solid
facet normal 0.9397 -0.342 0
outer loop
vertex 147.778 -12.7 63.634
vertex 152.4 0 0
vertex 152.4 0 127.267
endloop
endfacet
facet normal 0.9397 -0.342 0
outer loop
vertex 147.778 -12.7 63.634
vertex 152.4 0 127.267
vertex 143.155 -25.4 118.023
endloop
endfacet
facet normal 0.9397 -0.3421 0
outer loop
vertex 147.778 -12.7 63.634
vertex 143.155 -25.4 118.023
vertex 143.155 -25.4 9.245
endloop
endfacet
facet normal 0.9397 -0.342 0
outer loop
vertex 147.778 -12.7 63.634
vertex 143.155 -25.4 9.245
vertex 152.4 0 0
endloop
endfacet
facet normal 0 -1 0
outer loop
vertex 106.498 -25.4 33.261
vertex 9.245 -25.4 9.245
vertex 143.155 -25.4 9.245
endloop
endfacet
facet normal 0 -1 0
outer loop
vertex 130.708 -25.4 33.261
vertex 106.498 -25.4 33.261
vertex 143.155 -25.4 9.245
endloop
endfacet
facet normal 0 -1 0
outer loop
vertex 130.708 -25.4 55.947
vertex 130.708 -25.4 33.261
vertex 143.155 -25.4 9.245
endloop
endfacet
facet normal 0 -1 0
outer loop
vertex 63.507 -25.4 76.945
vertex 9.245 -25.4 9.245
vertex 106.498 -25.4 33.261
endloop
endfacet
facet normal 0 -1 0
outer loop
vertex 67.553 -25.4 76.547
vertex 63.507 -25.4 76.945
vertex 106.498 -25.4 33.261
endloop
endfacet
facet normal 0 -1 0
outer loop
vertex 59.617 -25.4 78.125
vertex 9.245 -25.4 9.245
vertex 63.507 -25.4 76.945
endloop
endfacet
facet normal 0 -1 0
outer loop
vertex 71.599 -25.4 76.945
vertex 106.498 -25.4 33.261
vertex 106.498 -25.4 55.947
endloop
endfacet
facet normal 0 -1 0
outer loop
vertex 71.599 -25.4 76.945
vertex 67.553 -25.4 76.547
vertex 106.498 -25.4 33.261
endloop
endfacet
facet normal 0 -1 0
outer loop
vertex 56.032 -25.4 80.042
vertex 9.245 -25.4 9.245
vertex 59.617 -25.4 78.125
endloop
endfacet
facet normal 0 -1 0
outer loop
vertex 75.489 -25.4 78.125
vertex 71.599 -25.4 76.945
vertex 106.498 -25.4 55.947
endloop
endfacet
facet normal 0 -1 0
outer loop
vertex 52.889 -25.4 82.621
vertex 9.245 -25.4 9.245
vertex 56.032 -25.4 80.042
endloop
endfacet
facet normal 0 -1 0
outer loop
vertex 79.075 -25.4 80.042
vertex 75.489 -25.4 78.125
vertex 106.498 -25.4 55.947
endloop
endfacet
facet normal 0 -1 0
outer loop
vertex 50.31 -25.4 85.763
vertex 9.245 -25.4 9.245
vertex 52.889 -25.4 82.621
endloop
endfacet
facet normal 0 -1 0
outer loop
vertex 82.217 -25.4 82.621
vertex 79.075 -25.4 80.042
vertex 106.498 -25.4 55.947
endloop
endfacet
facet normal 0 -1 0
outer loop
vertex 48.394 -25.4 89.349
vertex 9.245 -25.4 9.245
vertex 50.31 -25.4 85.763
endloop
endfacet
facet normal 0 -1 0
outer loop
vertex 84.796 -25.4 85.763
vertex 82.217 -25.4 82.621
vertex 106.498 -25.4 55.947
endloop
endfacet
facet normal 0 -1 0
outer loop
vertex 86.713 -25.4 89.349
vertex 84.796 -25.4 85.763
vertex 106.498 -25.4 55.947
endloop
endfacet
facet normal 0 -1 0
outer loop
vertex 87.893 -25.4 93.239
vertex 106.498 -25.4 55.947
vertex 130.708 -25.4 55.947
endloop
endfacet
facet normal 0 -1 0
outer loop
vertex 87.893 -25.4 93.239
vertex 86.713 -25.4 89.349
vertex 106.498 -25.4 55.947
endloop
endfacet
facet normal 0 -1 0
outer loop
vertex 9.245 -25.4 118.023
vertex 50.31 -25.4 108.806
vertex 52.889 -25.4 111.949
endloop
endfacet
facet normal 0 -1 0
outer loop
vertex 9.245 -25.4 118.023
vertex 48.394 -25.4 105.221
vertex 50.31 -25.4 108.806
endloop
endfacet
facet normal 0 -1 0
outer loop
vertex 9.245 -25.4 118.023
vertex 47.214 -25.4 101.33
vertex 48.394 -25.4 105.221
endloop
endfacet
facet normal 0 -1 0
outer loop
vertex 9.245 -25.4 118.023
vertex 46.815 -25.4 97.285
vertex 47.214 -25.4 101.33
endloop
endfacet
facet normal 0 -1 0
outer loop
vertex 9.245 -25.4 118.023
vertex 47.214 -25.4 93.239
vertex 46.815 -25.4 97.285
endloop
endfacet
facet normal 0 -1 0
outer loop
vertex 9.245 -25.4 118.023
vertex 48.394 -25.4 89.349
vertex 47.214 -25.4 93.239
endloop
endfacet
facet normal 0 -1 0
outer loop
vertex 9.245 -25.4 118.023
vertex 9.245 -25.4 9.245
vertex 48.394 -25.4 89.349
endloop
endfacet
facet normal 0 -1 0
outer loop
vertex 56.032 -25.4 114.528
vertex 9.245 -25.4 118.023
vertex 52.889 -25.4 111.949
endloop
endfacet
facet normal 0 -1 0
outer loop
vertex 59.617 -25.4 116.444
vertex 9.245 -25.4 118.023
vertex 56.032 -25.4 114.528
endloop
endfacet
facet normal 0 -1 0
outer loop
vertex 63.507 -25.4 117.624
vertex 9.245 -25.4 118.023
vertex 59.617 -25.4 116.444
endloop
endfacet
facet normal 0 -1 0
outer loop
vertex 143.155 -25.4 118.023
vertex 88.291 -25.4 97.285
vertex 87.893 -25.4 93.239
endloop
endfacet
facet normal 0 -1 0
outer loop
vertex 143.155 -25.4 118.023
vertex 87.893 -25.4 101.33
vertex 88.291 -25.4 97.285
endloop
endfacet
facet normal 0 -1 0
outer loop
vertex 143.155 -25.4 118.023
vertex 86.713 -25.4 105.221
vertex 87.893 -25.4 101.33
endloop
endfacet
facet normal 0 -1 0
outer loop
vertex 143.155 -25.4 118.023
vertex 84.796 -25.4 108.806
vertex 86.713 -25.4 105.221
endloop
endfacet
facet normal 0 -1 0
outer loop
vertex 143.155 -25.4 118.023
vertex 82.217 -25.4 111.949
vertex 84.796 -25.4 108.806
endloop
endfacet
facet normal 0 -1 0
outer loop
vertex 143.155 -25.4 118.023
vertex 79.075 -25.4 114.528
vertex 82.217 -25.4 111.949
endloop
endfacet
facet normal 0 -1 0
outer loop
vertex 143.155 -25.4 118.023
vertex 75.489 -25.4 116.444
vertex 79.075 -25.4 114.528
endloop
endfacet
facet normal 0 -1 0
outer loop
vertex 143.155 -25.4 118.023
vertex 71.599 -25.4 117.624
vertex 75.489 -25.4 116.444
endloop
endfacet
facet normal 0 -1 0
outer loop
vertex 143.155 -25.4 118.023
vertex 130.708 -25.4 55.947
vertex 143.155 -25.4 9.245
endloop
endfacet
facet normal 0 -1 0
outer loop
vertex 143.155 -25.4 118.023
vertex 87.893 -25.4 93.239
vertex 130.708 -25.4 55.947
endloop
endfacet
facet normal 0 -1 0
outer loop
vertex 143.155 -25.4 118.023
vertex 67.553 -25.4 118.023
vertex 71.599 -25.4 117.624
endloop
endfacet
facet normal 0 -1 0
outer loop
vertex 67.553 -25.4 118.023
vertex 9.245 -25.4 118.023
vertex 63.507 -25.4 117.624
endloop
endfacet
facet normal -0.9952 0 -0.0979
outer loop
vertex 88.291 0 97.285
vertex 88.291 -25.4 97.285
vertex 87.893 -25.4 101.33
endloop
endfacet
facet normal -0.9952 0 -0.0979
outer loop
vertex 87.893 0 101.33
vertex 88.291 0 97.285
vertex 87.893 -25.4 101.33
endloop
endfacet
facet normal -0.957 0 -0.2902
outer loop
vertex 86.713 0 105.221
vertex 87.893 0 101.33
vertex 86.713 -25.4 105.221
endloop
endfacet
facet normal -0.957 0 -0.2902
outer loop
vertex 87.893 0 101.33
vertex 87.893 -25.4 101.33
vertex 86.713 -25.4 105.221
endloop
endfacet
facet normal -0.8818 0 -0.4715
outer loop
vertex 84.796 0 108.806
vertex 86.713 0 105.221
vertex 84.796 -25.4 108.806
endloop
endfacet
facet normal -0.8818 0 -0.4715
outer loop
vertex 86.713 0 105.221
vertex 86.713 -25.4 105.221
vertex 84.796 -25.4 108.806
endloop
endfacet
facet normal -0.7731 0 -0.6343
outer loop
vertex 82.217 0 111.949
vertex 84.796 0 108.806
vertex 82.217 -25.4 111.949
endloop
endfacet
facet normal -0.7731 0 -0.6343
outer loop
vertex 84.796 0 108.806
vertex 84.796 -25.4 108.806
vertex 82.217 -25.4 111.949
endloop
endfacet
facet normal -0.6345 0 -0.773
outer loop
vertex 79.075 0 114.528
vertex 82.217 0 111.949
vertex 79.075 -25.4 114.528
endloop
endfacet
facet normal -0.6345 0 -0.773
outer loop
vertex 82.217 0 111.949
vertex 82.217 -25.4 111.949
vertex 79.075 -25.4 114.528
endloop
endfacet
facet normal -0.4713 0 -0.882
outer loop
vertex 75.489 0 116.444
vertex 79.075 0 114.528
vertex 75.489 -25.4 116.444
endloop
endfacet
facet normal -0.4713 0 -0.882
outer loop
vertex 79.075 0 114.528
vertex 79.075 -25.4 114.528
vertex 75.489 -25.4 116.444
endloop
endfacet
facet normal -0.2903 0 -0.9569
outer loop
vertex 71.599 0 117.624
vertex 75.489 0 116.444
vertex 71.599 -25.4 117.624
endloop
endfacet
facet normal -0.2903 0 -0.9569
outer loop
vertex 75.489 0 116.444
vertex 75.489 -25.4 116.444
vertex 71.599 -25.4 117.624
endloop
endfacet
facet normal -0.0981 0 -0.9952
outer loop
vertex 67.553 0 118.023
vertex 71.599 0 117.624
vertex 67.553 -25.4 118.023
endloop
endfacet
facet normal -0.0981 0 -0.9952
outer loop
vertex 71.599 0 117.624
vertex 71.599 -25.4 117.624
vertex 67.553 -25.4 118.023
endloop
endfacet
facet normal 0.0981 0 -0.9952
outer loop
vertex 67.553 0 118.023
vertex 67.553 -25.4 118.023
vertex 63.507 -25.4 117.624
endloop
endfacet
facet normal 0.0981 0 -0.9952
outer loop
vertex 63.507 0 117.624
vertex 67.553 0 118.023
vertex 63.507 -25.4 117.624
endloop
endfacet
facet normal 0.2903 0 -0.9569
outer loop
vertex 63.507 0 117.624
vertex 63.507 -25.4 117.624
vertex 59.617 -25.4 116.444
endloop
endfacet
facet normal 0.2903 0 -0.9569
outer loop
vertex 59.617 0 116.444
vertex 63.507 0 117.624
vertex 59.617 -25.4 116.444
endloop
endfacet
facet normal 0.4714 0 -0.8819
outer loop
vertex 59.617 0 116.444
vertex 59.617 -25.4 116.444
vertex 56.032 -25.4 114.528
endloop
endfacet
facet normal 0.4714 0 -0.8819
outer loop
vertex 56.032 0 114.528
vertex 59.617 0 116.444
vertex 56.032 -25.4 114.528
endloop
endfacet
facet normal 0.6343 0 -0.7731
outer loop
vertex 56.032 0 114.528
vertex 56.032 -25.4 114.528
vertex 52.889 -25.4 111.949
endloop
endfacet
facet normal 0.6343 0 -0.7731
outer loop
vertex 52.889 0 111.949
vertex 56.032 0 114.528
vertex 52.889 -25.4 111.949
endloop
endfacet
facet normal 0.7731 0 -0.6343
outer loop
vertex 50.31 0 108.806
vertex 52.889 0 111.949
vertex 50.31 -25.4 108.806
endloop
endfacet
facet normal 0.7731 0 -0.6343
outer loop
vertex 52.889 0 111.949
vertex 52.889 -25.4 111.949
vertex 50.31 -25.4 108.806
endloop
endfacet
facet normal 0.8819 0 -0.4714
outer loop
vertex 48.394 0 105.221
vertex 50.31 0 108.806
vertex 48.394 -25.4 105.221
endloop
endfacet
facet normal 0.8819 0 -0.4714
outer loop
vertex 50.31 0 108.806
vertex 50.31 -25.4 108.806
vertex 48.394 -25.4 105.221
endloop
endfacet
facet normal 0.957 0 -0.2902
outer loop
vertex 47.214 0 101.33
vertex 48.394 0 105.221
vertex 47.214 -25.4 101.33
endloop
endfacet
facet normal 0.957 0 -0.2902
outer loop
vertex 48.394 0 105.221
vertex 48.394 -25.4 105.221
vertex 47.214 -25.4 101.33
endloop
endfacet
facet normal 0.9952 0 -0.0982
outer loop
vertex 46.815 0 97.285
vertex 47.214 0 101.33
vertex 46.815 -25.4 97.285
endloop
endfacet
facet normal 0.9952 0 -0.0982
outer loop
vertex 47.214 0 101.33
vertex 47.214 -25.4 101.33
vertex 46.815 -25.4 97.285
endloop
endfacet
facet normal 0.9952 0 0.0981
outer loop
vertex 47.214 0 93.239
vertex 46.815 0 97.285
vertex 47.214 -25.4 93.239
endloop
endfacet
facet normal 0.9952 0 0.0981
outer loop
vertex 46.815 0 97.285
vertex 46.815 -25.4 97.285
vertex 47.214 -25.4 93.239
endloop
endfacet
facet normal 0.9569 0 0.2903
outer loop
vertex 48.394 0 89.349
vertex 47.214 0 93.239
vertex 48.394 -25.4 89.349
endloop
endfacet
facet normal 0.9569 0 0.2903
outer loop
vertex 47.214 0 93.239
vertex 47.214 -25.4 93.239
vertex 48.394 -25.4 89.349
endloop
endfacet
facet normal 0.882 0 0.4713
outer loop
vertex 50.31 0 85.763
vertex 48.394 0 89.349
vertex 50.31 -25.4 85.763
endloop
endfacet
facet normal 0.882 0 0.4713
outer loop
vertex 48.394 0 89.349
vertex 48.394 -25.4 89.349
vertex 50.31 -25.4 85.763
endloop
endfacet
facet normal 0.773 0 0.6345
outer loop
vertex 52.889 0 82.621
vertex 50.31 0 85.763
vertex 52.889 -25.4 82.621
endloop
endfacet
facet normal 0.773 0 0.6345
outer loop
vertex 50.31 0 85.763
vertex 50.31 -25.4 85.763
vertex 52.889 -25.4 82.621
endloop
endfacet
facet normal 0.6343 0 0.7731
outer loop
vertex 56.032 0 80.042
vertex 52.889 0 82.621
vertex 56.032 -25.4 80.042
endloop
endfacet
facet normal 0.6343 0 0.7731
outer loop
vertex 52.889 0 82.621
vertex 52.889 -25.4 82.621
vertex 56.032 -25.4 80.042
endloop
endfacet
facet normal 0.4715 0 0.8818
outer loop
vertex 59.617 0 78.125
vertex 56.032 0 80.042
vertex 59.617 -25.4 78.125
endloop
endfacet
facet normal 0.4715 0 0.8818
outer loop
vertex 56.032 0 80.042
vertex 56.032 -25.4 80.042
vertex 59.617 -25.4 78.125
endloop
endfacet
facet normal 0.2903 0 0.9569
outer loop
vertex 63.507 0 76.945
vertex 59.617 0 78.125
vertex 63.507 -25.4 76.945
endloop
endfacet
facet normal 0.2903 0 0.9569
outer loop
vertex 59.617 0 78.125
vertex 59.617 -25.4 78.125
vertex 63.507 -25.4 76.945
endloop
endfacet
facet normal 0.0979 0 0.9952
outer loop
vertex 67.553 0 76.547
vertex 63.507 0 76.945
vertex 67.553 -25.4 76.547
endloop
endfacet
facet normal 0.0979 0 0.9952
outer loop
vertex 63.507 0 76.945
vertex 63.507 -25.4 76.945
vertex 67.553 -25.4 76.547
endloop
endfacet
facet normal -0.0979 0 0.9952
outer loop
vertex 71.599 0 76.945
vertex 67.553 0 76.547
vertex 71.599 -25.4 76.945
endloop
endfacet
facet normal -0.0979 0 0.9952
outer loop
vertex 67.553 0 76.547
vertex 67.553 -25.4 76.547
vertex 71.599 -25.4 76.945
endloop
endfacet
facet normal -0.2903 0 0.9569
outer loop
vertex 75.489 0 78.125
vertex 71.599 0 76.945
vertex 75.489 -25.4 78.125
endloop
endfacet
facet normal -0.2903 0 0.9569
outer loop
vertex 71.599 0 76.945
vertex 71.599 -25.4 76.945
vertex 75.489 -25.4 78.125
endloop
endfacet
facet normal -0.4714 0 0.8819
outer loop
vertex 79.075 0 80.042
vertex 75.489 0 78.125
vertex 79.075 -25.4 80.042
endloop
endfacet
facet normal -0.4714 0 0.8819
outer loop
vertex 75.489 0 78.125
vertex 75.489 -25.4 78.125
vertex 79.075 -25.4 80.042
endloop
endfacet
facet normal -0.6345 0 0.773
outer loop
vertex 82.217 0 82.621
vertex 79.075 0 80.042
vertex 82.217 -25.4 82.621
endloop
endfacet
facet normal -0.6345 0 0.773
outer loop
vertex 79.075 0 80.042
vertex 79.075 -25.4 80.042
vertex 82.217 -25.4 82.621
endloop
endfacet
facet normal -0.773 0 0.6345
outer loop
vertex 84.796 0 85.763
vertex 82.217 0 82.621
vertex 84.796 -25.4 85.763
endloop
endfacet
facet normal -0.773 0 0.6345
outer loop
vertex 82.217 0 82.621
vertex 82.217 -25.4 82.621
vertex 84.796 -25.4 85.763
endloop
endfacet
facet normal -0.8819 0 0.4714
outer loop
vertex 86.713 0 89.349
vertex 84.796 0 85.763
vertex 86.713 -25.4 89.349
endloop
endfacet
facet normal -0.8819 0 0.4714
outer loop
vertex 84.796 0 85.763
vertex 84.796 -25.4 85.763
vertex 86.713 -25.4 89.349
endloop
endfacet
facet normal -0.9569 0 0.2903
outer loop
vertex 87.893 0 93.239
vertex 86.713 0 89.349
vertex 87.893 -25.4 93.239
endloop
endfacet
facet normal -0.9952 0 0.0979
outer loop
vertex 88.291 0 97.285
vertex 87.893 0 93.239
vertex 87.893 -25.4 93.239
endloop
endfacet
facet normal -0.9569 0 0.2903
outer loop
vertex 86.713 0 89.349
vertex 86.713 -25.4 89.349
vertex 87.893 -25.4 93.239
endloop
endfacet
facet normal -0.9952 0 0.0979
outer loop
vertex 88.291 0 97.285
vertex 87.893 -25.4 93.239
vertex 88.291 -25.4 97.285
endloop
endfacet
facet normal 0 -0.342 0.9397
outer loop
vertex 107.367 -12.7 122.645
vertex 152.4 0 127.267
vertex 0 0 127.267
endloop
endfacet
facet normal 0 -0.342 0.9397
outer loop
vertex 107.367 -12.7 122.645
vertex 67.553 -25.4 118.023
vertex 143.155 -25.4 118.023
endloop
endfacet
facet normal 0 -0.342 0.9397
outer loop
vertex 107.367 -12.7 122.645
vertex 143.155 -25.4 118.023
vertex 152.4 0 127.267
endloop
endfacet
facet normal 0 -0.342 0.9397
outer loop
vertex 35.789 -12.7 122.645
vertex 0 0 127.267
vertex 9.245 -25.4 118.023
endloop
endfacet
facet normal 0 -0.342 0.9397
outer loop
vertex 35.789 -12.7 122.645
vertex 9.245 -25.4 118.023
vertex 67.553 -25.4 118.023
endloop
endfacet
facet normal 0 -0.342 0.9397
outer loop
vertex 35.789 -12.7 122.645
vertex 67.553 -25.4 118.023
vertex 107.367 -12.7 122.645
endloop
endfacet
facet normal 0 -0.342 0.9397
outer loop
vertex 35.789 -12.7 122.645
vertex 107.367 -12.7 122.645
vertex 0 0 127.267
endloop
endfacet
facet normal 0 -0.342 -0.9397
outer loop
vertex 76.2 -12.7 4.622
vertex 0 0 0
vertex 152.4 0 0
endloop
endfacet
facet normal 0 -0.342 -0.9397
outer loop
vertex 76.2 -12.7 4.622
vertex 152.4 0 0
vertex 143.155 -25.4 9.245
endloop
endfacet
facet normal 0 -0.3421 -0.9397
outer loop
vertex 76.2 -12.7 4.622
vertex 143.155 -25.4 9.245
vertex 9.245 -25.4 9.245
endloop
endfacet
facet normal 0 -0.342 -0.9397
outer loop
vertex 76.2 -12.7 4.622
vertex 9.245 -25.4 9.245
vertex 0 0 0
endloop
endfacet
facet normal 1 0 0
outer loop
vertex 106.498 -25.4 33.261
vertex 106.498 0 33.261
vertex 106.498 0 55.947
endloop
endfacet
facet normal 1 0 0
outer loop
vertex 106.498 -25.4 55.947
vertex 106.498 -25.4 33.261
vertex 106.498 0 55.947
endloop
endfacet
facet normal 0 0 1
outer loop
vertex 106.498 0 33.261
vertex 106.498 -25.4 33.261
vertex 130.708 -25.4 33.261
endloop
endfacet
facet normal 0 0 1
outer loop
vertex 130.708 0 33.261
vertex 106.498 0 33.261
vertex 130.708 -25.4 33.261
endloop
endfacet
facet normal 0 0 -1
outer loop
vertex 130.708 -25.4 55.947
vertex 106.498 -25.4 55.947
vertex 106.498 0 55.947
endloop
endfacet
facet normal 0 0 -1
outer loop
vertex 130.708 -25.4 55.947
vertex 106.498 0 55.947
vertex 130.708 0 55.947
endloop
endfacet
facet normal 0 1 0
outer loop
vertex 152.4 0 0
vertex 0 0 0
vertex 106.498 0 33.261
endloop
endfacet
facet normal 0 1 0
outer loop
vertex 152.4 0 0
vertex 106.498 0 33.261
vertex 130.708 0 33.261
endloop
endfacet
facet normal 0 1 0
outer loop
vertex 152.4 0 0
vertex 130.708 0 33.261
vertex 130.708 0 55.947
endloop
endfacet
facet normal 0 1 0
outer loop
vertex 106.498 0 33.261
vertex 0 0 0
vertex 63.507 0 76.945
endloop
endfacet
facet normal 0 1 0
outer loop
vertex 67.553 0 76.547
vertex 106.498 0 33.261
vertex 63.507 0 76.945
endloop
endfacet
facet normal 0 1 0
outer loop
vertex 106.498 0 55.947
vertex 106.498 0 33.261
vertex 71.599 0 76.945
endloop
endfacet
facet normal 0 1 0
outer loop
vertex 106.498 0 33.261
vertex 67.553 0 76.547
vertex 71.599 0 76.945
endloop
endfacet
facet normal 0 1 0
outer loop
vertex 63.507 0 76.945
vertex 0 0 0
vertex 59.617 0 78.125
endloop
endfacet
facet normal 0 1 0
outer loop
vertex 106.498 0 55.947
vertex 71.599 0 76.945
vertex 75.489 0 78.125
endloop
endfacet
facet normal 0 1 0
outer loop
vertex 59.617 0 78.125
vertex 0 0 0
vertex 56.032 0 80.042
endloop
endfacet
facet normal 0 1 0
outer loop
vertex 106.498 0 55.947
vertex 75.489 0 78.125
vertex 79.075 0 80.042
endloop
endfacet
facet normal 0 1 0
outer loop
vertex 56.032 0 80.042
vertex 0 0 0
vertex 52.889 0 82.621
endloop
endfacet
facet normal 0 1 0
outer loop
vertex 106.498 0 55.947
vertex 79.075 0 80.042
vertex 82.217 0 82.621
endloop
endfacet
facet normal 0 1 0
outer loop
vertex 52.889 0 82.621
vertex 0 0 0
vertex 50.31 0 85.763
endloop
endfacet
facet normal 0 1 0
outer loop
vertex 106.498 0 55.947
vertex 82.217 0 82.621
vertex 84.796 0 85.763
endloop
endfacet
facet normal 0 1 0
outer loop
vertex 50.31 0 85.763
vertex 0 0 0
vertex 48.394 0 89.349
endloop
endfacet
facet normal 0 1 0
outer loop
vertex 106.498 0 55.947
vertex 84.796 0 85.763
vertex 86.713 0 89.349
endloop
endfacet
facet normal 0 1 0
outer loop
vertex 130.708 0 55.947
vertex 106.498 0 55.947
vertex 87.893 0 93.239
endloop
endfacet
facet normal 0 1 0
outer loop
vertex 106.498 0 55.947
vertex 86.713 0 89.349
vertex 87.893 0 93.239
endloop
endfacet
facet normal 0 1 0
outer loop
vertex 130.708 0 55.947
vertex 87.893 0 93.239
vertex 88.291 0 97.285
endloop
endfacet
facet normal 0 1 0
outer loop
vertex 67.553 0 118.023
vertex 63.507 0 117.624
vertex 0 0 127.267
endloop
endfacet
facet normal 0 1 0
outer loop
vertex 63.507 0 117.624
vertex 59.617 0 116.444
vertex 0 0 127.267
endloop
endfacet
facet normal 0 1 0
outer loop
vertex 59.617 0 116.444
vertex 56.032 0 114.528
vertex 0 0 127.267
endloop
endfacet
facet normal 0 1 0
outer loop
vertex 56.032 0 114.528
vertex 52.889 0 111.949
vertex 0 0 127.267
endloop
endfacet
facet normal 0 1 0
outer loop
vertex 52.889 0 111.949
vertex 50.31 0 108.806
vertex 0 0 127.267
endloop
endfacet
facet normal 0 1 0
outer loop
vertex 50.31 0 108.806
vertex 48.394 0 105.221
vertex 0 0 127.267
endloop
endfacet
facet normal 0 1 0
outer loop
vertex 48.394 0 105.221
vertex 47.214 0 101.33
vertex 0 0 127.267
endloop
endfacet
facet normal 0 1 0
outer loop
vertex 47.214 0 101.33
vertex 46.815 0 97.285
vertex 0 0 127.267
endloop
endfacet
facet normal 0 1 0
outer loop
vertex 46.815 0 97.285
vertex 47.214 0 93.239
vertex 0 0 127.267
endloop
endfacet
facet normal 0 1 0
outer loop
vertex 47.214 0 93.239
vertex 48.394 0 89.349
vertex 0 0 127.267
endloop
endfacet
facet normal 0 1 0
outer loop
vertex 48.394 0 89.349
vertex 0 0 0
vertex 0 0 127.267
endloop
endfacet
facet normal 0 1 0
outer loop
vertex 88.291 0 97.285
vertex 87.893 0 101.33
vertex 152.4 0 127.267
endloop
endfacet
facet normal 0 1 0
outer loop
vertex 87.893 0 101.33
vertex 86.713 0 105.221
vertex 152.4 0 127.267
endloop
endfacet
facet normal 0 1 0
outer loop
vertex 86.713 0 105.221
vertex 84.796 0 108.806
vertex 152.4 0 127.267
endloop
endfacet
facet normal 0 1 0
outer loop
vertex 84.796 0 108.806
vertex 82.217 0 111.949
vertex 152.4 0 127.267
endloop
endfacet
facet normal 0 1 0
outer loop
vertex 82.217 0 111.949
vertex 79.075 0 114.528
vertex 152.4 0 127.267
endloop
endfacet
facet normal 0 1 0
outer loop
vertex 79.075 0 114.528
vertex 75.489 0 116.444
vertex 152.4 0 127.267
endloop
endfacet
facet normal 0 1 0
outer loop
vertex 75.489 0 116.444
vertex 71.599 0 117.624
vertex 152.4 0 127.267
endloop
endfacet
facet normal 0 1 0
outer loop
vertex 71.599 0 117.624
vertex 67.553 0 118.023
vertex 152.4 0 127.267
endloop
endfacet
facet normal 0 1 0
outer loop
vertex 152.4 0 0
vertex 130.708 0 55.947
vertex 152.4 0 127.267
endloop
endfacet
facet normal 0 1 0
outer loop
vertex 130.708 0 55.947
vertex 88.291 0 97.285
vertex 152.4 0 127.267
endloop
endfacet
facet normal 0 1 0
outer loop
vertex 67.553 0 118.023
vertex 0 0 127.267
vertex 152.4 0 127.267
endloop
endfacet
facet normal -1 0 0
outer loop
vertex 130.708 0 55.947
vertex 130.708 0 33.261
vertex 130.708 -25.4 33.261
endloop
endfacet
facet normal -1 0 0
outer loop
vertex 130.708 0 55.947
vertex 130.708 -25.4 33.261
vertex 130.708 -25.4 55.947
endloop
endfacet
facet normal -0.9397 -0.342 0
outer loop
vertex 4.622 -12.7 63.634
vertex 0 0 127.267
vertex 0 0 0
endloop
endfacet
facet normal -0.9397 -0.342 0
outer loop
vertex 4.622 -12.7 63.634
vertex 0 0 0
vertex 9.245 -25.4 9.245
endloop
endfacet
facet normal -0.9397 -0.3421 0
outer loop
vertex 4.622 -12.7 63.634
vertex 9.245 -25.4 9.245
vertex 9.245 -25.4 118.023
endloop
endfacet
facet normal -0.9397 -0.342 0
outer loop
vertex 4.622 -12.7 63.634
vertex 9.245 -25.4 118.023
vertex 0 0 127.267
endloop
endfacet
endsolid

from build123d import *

# Parameters (mm, degrees)
F0_W     = 152.4
F0_H     = 127.2674917114
F1_DEPTH = 25.4
F1_TAPER = 20
F2_W     = 24.2093652487
F2_H     = 22.6856842637
F3_DEPTH = 25.4
F4_R     = 20.7379881478
F5_DEPTH = 25.4010001


with BuildPart() as f1:
    # F0 (on Front) → F1 (new body)
    with BuildSketch(Plane.XZ):
        with Locations((76.2, 63.6337458557)):
            Rectangle(F0_W, F0_H)
    extrude(amount=F1_DEPTH, taper=F1_TAPER)

    # F2 (on face) → F3 (cut)
    with BuildSketch(Plane.XZ.offset(25.4)):
        with Locations((118.6031028628, 44.6040146053)):
            Rectangle(F2_W, F2_H)
    extrude(amount=-F3_DEPTH, mode=Mode.SUBTRACT)

    # F4 (on face) → F5 (cut, through all)
    with BuildSketch(Plane.XZ.offset(25.4)):
        with Locations((67.5532594323, 97.2846596132)):
            Circle(F4_R)
    extrude(amount=-F5_DEPTH, mode=Mode.SUBTRACT)


solid = f1.part
